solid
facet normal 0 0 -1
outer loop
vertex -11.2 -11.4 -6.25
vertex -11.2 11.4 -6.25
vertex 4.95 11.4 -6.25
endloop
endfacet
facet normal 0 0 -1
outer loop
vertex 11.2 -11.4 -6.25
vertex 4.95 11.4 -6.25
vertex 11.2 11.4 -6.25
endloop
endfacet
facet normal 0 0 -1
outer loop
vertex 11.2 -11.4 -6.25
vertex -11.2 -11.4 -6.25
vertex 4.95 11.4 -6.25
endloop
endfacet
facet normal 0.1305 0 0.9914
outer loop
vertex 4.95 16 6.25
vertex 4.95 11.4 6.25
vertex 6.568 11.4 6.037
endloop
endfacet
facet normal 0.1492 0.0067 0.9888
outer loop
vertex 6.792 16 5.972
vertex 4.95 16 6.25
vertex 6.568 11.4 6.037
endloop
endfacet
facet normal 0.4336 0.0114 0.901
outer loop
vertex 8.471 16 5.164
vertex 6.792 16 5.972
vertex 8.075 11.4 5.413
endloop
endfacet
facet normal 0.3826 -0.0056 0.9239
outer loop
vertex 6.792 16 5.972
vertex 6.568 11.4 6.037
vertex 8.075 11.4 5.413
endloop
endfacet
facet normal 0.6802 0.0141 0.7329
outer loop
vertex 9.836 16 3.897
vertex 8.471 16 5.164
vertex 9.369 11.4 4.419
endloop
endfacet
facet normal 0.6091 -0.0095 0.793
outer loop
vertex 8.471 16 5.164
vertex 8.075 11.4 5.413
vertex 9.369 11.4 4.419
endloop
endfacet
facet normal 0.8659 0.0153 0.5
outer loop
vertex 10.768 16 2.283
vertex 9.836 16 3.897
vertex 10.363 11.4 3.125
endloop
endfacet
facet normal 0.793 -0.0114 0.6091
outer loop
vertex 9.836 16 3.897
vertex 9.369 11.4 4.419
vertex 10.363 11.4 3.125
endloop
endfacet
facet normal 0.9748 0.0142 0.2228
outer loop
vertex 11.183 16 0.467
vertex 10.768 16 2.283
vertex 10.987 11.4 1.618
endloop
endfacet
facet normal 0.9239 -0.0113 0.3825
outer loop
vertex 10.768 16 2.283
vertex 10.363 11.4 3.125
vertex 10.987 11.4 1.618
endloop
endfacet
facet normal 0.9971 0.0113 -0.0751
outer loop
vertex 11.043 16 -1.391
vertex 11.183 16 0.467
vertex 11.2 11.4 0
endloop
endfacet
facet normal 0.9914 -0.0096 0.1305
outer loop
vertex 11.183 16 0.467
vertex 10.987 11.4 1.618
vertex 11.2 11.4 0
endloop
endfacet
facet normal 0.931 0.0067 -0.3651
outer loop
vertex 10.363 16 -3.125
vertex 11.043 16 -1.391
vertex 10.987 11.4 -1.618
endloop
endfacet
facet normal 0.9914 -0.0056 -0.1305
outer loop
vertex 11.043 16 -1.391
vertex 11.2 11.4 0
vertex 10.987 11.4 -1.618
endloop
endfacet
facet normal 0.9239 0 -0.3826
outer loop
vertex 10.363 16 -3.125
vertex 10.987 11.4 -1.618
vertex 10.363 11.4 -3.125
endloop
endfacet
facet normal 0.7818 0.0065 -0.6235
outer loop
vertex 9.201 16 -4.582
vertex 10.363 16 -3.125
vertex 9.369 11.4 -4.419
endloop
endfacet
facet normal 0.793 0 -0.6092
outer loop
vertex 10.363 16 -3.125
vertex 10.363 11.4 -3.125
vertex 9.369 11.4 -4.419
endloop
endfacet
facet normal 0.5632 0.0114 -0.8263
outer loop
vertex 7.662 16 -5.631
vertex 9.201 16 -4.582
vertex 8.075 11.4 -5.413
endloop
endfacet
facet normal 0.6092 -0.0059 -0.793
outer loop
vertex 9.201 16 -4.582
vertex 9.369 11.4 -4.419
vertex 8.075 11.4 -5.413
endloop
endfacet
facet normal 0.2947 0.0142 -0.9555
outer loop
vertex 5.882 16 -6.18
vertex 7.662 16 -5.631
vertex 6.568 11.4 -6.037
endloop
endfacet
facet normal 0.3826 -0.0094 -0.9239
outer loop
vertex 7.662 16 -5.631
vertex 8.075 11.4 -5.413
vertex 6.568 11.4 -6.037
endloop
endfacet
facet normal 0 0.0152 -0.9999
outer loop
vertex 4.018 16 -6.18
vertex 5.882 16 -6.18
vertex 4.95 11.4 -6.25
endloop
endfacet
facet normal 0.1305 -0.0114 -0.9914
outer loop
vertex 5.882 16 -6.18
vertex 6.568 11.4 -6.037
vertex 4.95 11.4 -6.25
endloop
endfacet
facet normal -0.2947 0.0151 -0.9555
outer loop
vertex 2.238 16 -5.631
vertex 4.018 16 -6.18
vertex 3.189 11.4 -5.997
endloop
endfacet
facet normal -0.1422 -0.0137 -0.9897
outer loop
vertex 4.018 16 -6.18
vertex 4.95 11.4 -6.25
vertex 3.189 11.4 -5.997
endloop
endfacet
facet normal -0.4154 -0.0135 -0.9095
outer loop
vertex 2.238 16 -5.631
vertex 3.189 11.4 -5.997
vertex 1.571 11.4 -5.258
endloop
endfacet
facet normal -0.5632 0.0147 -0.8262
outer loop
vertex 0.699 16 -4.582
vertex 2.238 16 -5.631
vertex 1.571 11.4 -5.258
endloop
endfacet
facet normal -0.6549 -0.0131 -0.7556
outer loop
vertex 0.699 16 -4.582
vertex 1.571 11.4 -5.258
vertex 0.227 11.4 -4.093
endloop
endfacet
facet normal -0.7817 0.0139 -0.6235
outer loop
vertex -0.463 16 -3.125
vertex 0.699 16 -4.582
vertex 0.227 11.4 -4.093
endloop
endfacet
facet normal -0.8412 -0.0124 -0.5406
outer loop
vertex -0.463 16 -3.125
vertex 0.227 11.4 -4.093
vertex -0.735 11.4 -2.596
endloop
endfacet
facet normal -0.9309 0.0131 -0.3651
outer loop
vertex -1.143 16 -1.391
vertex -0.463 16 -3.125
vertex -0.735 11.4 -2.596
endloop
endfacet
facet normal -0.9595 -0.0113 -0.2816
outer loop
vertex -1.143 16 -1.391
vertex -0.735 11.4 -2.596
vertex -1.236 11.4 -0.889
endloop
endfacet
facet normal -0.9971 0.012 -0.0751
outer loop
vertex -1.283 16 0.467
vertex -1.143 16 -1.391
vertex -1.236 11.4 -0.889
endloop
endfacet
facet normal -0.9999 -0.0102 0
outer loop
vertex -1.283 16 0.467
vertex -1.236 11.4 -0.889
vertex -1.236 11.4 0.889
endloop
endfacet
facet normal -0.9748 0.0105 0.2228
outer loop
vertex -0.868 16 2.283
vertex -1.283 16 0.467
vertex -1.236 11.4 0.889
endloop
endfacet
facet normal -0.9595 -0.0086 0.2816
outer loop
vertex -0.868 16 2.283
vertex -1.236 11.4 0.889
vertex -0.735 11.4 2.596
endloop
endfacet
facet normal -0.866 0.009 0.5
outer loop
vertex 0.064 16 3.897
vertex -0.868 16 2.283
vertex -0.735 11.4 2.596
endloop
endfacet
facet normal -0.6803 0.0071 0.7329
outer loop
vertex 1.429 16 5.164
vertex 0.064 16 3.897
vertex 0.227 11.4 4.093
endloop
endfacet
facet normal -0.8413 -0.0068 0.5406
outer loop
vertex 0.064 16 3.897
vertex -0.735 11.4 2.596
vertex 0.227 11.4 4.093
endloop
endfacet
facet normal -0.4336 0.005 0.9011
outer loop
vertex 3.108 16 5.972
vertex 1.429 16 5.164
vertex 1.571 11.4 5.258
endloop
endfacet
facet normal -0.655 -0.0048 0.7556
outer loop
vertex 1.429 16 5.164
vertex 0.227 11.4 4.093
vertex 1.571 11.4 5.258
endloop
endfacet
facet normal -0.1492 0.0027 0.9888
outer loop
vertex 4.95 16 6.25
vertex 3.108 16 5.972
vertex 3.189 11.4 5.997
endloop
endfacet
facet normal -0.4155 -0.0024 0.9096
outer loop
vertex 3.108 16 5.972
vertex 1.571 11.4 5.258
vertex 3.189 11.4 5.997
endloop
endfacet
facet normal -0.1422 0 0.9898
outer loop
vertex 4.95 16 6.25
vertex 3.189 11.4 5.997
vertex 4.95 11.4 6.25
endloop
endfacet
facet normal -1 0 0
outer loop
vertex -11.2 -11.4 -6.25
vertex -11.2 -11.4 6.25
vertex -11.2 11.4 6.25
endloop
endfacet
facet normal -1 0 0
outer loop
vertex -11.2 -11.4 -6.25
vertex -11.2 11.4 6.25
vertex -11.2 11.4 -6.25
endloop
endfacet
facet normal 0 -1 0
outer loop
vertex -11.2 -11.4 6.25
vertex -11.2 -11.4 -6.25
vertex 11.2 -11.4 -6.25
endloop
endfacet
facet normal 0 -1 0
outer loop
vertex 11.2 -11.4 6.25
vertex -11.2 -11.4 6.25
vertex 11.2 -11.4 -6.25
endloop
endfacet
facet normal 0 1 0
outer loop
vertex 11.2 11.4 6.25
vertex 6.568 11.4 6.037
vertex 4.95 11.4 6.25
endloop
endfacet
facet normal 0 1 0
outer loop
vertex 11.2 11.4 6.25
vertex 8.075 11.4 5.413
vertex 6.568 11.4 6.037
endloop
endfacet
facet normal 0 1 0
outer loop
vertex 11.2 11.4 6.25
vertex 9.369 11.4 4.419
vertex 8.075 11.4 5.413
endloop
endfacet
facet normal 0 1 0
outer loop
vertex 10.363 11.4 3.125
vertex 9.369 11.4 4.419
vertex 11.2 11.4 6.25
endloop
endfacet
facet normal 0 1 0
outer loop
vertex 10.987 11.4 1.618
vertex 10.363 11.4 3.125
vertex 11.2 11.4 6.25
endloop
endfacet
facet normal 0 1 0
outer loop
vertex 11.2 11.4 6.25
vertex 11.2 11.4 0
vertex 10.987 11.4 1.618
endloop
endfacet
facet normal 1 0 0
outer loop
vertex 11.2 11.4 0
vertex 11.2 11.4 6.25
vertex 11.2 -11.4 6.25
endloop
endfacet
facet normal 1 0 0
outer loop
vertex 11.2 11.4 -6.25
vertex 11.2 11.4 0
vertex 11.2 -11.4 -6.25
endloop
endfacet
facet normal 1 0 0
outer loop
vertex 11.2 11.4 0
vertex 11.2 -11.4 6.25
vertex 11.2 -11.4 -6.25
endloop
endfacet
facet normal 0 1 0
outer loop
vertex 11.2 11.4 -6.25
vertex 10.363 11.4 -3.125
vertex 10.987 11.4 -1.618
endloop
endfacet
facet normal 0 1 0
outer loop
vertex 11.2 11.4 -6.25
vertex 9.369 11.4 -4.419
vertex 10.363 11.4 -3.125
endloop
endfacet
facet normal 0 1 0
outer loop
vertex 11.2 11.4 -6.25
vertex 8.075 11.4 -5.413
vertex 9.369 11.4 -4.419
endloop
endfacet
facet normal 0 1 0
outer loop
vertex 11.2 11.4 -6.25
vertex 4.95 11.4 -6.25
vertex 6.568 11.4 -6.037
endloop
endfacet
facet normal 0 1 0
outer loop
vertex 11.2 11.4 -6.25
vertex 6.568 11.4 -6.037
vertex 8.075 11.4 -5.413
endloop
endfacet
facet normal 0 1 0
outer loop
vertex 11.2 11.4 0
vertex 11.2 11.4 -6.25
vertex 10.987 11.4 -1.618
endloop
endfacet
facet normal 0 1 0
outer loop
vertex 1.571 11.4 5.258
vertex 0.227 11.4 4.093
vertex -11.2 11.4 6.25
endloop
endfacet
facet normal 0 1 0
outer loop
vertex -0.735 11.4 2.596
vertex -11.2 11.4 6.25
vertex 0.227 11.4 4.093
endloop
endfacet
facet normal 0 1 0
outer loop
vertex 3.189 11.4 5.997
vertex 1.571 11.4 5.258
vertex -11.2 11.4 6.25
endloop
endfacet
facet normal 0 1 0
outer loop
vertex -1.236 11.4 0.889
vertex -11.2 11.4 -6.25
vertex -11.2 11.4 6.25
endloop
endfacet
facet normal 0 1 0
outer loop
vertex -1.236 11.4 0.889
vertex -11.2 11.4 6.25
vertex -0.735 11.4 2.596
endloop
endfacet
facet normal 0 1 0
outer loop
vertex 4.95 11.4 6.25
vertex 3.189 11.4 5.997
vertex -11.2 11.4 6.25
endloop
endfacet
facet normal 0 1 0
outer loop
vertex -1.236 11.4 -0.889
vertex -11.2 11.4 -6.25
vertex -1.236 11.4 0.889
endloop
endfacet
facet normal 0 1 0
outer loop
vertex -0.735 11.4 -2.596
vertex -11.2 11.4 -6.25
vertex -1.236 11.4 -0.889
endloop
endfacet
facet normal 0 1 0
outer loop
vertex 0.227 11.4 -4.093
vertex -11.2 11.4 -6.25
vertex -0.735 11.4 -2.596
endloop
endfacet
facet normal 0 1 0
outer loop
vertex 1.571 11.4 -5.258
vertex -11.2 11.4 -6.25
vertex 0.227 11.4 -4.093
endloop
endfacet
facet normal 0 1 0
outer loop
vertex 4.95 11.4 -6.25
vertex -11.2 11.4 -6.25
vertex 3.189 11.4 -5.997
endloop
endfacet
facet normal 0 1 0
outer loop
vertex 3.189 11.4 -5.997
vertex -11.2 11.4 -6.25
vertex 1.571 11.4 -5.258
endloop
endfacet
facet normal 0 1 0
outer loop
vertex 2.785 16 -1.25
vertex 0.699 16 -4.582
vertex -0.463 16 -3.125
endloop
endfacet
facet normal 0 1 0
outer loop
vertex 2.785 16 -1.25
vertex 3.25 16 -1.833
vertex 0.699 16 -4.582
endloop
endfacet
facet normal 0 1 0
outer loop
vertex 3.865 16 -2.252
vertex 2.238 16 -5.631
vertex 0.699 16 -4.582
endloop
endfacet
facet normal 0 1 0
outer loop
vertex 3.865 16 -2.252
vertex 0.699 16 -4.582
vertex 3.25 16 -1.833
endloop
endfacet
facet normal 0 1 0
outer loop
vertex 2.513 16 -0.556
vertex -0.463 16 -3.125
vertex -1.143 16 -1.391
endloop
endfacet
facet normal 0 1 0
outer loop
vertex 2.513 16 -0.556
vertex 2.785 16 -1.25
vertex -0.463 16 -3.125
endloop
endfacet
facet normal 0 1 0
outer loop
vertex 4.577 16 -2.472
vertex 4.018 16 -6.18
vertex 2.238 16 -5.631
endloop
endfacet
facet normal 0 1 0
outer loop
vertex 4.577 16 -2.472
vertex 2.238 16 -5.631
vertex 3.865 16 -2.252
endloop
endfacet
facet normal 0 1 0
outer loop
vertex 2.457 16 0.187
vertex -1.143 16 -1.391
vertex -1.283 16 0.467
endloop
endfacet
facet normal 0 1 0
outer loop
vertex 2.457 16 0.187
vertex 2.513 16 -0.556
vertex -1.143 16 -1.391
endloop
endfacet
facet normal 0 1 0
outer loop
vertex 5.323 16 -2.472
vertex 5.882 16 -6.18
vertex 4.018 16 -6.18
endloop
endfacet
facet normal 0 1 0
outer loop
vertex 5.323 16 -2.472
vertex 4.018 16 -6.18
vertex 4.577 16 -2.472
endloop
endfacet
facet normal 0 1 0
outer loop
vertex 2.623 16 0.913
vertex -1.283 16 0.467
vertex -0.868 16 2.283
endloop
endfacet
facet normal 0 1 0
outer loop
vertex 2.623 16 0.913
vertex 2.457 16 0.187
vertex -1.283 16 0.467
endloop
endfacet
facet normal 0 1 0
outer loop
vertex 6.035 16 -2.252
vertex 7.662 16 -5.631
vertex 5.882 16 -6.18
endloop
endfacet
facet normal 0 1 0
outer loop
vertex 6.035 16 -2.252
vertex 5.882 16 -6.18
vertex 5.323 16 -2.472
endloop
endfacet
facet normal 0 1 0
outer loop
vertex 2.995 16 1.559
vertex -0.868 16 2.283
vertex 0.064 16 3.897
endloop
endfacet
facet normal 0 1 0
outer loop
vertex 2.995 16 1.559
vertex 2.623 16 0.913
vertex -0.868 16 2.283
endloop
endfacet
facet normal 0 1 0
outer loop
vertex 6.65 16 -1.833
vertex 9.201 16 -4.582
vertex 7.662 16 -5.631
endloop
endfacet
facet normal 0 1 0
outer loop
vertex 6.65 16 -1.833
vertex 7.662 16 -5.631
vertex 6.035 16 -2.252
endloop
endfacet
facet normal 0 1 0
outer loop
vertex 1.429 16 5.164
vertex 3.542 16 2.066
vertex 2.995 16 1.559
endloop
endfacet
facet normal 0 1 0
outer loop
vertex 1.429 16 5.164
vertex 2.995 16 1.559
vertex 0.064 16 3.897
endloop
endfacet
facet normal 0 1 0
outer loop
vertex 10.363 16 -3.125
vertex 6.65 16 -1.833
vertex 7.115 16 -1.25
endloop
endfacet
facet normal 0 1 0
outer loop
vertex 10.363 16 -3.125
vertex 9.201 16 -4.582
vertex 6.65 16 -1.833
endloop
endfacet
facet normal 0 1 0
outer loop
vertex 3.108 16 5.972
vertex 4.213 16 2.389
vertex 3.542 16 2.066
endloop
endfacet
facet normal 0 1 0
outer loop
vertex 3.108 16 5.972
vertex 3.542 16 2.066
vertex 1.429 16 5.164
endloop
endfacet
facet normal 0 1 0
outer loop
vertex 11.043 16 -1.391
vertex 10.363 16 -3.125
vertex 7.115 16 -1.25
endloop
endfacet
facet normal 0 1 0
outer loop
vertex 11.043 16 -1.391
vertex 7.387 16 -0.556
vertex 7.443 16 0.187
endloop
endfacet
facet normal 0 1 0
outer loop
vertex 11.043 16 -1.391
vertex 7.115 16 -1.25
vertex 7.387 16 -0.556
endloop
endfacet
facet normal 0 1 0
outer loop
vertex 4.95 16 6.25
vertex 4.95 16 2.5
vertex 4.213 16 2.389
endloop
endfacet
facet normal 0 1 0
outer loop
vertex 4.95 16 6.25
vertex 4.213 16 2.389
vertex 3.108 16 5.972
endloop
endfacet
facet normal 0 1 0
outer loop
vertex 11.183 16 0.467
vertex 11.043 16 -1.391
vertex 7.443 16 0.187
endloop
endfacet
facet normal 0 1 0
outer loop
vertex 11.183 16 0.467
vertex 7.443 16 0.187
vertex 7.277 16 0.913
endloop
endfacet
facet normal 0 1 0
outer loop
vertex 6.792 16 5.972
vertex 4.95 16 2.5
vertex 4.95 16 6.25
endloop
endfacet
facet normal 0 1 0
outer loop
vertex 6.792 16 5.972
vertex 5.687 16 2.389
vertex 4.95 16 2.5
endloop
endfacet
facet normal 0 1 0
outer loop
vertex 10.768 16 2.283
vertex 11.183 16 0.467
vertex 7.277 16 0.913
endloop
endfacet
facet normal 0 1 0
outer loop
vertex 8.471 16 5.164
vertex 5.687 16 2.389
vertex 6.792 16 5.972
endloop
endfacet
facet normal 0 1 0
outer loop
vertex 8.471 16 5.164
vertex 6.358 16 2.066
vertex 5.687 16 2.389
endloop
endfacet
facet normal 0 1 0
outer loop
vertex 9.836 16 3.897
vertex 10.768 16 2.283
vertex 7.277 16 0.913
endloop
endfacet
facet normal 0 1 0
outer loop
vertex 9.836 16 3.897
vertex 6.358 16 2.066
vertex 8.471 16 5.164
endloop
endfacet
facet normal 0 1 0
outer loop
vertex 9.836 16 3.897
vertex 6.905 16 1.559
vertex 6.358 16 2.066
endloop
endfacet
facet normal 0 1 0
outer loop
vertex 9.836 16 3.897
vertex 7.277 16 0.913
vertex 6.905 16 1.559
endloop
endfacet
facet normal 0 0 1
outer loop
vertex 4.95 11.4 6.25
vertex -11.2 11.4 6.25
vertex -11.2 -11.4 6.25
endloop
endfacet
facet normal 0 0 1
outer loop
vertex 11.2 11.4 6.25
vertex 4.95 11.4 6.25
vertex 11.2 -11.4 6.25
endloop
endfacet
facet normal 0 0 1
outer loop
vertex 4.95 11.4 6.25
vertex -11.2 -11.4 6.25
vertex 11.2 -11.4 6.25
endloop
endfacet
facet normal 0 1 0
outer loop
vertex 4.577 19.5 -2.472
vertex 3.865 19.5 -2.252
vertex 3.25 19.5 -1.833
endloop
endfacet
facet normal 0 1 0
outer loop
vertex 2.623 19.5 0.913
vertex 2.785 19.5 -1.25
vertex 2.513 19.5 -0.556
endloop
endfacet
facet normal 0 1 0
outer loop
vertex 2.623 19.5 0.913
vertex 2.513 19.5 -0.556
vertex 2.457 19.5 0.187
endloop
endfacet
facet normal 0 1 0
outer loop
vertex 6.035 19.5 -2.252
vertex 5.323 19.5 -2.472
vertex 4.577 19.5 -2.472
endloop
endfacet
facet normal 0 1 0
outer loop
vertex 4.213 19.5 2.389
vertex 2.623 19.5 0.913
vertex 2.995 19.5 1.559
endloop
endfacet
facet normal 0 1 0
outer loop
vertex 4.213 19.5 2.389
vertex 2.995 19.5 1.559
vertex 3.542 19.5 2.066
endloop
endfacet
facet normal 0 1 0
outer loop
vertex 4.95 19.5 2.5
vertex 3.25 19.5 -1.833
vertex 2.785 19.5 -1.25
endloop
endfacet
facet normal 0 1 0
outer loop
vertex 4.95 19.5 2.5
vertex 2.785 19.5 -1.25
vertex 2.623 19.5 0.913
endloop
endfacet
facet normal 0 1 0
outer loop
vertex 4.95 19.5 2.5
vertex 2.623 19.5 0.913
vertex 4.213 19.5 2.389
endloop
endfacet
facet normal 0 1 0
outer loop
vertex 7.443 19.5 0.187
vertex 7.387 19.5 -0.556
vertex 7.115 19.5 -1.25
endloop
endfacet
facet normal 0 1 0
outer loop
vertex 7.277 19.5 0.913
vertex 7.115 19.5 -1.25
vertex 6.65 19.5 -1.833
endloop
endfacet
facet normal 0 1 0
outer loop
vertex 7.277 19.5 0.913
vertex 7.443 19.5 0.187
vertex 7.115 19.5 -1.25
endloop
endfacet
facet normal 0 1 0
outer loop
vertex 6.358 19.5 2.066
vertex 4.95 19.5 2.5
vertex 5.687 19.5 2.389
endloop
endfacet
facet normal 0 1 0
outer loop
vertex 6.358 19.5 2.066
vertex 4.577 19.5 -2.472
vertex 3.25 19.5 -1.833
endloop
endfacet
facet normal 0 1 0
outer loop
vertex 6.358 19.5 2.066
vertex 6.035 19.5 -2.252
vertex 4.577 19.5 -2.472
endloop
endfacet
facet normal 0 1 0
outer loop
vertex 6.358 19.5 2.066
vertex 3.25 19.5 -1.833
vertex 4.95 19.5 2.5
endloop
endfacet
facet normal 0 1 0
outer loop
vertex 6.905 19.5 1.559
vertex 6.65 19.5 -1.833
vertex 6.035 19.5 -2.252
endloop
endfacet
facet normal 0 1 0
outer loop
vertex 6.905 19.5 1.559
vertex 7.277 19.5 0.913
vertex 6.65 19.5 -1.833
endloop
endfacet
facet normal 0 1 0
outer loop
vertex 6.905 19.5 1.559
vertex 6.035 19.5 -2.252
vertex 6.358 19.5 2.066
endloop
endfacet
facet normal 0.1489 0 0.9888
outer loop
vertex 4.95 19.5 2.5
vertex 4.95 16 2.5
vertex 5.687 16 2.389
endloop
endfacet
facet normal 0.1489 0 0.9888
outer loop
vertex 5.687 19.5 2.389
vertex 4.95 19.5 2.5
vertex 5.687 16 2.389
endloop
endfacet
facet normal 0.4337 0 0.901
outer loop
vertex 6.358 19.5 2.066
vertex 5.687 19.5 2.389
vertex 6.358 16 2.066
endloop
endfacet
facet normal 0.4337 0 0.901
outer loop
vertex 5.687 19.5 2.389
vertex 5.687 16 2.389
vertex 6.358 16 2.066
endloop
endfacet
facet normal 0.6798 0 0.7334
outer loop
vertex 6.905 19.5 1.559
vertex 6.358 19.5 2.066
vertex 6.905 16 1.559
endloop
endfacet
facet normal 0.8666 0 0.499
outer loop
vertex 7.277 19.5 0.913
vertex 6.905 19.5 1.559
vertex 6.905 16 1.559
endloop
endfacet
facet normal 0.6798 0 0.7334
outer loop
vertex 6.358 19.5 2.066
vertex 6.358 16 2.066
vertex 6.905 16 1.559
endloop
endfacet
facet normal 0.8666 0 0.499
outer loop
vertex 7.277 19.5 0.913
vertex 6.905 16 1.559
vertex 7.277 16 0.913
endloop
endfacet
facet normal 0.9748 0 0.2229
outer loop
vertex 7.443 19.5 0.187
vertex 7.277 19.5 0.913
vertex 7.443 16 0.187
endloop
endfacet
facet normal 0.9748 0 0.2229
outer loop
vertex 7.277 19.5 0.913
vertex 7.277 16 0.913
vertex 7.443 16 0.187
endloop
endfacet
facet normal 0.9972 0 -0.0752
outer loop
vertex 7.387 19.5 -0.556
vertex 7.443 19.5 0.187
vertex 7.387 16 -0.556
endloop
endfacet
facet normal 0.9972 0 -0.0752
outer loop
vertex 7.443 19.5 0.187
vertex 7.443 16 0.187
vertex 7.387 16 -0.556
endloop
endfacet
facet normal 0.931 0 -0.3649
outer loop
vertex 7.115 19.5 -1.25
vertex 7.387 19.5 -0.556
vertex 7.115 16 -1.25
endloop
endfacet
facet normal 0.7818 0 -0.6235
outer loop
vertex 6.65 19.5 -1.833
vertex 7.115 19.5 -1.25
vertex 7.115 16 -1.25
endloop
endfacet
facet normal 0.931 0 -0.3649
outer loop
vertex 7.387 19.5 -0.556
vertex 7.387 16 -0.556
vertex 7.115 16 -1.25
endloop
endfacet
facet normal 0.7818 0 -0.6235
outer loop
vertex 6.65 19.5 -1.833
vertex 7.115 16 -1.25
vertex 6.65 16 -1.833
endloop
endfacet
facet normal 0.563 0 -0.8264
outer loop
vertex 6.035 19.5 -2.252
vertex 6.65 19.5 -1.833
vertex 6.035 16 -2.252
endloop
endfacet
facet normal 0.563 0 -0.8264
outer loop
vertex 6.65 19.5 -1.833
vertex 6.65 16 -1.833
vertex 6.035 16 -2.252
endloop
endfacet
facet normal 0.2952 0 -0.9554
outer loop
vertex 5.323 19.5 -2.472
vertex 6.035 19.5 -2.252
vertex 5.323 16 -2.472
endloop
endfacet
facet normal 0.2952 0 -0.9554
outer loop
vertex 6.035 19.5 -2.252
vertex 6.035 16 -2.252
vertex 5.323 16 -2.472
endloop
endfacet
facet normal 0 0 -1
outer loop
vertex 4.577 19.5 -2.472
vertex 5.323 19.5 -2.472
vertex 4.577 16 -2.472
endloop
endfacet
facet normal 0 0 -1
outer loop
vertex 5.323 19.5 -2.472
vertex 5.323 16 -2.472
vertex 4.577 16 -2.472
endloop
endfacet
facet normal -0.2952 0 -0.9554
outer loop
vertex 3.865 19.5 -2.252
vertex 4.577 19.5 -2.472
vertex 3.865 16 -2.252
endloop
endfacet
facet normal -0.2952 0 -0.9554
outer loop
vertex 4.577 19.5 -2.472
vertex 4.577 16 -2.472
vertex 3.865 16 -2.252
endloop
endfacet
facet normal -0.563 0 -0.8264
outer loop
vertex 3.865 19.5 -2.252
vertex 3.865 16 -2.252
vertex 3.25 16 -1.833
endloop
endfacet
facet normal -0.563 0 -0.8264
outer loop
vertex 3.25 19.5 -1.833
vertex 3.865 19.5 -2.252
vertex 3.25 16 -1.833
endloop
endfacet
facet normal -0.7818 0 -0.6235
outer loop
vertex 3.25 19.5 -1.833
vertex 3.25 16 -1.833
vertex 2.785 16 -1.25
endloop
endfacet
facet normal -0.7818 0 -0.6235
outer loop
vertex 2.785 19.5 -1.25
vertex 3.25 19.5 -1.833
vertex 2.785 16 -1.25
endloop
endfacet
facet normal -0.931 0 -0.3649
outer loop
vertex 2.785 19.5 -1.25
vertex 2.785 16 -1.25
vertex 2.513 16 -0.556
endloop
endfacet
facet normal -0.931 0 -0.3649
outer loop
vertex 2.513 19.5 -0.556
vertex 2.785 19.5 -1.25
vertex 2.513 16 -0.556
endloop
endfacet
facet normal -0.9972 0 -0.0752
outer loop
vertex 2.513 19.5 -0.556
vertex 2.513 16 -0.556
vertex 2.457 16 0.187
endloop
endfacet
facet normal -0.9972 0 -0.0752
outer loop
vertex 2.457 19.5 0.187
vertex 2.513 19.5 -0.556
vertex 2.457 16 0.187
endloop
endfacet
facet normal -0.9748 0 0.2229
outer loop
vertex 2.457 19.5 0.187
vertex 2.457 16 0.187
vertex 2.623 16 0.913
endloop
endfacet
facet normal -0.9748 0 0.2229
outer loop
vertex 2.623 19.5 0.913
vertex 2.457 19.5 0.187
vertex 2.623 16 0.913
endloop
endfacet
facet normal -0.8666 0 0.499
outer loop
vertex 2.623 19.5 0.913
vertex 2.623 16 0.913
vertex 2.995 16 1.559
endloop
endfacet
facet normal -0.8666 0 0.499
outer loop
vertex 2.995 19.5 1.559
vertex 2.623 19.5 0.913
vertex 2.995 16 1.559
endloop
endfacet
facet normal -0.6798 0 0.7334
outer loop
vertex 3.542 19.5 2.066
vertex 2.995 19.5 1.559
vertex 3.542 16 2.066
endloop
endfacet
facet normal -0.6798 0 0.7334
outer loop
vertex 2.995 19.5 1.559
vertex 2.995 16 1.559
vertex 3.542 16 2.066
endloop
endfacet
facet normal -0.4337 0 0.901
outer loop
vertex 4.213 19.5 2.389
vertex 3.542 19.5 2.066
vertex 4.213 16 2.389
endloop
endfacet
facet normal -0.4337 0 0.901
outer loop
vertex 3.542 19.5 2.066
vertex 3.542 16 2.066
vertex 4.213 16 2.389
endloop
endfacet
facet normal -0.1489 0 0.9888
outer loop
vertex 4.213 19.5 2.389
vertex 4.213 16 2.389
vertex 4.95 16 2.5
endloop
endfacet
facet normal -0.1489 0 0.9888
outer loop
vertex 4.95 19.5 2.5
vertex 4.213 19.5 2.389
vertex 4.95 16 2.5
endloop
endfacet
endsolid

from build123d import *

# Parameters (mm, degrees)
BOSS_EXTRUDE2_DEPTH      = 11.4
BOSS_EXTRUDE2_DEPTH_BACK = 11.4
SKETCH1_W                = 22.4
SKETCH1_H                = 12.5
SKETCH3_R                = 6.25
BOSS_EXTRUDE3_DEPTH      = 4.6
SKETCH4_R                = 2.5
BOSS_EXTRUDE4_DEPTH      = 3.5


with BuildPart() as part:
    # Sketch1 → Boss-Extrude2 (new, two sides: drawn at the far end of the back side and taken through both)
    with BuildSketch(Plane(origin=(0, 0, 0), x_dir=(1, 0, 0), z_dir=(0, 1, 0)).offset(-BOSS_EXTRUDE2_DEPTH_BACK)):
        Rectangle(SKETCH1_W, SKETCH1_H)
    extrude(amount=BOSS_EXTRUDE2_DEPTH + BOSS_EXTRUDE2_DEPTH_BACK)

    # Sketch3 → Boss-Extrude3 (add)
    with BuildSketch(Plane(origin=(0, 11.4, 0), x_dir=(1, 0, 0), z_dir=(0, 1, 0))):
        with Locations((4.95, 0)):
            Circle(SKETCH3_R)
    extrude(amount=BOSS_EXTRUDE3_DEPTH)

    # Sketch4 → Boss-Extrude4 (add)
    with BuildSketch(Plane(origin=(0, 16, 0), x_dir=(1, 0, 0), z_dir=(0, 1, 0))):
        with Locations((4.95, 0)):
            Circle(SKETCH4_R)
    extrude(amount=BOSS_EXTRUDE4_DEPTH)


solid = part.part
